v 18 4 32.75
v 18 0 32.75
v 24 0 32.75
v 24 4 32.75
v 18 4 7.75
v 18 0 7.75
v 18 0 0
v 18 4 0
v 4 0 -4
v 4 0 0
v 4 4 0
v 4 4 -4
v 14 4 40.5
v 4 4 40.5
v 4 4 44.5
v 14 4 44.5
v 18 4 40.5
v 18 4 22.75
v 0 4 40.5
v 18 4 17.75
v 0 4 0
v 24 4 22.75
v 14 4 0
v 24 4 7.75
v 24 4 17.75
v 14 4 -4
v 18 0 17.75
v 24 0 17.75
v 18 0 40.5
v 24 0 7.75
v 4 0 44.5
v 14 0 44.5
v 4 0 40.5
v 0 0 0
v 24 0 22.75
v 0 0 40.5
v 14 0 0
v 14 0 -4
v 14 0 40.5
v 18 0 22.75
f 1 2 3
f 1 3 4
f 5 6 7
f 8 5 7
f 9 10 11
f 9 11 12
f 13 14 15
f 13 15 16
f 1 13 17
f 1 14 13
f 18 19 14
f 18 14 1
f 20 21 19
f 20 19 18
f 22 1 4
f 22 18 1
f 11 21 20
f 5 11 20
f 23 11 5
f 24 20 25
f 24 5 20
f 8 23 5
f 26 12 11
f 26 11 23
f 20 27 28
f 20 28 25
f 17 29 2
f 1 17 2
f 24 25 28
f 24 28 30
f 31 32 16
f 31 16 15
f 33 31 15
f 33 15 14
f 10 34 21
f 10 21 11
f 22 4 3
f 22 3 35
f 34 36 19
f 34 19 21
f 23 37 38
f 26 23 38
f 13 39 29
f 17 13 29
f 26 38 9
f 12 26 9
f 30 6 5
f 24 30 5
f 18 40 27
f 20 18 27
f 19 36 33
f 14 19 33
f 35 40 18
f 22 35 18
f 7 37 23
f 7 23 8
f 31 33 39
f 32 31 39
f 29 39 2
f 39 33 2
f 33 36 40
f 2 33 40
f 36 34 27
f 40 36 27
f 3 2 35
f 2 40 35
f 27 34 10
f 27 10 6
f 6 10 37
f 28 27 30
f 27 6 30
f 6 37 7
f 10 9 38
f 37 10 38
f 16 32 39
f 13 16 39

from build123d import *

# Parameters (mm, degrees)
SKETCH1_W           = 18
SKETCH1_H           = 40.5
BOSS_EXTRUDE1_DEPTH = 4
SKETCH2_W           = 10
SKETCH2_H           = 4
BOSS_EXTRUDE2_DEPTH = 4
SKETCH3_W           = 10
SKETCH3_H           = 4
BOSS_EXTRUDE3_DEPTH = 6


with BuildPart() as part:
    # Sketch1 → Boss-Extrude1 (new body)
    with BuildSketch(Plane(origin=(0, 0, 0), x_dir=(1, 0, 0), z_dir=(0, 1, 0))):
        with Locations((9, -20.25)):
            Rectangle(SKETCH1_W, SKETCH1_H)
    extrude(amount=BOSS_EXTRUDE1_DEPTH)

    # Sketch2 → Boss-Extrude2 (add, through all)
    with BuildSketch(Plane(origin=(0, 0, 0), x_dir=(-1, 0, 0), z_dir=(0, -1, 0))):
        with Locations((-9, 2)):
            Rectangle(SKETCH2_W, SKETCH2_H)
        with Locations((-9, -42.5)):
            Rectangle(SKETCH2_W, SKETCH2_H)
    extrude(amount=-BOSS_EXTRUDE2_DEPTH)

    # Sketch3 → Boss-Extrude3 (add)
    with BuildSketch(Plane(origin=(18, 0, 0), x_dir=(0, 0, -1), z_dir=(1, 0, 0))):
        with Locations((-12.75, 2)):
            Rectangle(SKETCH3_W, SKETCH3_H)
        with Locations((-27.75, 2)):
            Rectangle(SKETCH3_W, SKETCH3_H)
    extrude(amount=BOSS_EXTRUDE3_DEPTH)


solid = part.part
